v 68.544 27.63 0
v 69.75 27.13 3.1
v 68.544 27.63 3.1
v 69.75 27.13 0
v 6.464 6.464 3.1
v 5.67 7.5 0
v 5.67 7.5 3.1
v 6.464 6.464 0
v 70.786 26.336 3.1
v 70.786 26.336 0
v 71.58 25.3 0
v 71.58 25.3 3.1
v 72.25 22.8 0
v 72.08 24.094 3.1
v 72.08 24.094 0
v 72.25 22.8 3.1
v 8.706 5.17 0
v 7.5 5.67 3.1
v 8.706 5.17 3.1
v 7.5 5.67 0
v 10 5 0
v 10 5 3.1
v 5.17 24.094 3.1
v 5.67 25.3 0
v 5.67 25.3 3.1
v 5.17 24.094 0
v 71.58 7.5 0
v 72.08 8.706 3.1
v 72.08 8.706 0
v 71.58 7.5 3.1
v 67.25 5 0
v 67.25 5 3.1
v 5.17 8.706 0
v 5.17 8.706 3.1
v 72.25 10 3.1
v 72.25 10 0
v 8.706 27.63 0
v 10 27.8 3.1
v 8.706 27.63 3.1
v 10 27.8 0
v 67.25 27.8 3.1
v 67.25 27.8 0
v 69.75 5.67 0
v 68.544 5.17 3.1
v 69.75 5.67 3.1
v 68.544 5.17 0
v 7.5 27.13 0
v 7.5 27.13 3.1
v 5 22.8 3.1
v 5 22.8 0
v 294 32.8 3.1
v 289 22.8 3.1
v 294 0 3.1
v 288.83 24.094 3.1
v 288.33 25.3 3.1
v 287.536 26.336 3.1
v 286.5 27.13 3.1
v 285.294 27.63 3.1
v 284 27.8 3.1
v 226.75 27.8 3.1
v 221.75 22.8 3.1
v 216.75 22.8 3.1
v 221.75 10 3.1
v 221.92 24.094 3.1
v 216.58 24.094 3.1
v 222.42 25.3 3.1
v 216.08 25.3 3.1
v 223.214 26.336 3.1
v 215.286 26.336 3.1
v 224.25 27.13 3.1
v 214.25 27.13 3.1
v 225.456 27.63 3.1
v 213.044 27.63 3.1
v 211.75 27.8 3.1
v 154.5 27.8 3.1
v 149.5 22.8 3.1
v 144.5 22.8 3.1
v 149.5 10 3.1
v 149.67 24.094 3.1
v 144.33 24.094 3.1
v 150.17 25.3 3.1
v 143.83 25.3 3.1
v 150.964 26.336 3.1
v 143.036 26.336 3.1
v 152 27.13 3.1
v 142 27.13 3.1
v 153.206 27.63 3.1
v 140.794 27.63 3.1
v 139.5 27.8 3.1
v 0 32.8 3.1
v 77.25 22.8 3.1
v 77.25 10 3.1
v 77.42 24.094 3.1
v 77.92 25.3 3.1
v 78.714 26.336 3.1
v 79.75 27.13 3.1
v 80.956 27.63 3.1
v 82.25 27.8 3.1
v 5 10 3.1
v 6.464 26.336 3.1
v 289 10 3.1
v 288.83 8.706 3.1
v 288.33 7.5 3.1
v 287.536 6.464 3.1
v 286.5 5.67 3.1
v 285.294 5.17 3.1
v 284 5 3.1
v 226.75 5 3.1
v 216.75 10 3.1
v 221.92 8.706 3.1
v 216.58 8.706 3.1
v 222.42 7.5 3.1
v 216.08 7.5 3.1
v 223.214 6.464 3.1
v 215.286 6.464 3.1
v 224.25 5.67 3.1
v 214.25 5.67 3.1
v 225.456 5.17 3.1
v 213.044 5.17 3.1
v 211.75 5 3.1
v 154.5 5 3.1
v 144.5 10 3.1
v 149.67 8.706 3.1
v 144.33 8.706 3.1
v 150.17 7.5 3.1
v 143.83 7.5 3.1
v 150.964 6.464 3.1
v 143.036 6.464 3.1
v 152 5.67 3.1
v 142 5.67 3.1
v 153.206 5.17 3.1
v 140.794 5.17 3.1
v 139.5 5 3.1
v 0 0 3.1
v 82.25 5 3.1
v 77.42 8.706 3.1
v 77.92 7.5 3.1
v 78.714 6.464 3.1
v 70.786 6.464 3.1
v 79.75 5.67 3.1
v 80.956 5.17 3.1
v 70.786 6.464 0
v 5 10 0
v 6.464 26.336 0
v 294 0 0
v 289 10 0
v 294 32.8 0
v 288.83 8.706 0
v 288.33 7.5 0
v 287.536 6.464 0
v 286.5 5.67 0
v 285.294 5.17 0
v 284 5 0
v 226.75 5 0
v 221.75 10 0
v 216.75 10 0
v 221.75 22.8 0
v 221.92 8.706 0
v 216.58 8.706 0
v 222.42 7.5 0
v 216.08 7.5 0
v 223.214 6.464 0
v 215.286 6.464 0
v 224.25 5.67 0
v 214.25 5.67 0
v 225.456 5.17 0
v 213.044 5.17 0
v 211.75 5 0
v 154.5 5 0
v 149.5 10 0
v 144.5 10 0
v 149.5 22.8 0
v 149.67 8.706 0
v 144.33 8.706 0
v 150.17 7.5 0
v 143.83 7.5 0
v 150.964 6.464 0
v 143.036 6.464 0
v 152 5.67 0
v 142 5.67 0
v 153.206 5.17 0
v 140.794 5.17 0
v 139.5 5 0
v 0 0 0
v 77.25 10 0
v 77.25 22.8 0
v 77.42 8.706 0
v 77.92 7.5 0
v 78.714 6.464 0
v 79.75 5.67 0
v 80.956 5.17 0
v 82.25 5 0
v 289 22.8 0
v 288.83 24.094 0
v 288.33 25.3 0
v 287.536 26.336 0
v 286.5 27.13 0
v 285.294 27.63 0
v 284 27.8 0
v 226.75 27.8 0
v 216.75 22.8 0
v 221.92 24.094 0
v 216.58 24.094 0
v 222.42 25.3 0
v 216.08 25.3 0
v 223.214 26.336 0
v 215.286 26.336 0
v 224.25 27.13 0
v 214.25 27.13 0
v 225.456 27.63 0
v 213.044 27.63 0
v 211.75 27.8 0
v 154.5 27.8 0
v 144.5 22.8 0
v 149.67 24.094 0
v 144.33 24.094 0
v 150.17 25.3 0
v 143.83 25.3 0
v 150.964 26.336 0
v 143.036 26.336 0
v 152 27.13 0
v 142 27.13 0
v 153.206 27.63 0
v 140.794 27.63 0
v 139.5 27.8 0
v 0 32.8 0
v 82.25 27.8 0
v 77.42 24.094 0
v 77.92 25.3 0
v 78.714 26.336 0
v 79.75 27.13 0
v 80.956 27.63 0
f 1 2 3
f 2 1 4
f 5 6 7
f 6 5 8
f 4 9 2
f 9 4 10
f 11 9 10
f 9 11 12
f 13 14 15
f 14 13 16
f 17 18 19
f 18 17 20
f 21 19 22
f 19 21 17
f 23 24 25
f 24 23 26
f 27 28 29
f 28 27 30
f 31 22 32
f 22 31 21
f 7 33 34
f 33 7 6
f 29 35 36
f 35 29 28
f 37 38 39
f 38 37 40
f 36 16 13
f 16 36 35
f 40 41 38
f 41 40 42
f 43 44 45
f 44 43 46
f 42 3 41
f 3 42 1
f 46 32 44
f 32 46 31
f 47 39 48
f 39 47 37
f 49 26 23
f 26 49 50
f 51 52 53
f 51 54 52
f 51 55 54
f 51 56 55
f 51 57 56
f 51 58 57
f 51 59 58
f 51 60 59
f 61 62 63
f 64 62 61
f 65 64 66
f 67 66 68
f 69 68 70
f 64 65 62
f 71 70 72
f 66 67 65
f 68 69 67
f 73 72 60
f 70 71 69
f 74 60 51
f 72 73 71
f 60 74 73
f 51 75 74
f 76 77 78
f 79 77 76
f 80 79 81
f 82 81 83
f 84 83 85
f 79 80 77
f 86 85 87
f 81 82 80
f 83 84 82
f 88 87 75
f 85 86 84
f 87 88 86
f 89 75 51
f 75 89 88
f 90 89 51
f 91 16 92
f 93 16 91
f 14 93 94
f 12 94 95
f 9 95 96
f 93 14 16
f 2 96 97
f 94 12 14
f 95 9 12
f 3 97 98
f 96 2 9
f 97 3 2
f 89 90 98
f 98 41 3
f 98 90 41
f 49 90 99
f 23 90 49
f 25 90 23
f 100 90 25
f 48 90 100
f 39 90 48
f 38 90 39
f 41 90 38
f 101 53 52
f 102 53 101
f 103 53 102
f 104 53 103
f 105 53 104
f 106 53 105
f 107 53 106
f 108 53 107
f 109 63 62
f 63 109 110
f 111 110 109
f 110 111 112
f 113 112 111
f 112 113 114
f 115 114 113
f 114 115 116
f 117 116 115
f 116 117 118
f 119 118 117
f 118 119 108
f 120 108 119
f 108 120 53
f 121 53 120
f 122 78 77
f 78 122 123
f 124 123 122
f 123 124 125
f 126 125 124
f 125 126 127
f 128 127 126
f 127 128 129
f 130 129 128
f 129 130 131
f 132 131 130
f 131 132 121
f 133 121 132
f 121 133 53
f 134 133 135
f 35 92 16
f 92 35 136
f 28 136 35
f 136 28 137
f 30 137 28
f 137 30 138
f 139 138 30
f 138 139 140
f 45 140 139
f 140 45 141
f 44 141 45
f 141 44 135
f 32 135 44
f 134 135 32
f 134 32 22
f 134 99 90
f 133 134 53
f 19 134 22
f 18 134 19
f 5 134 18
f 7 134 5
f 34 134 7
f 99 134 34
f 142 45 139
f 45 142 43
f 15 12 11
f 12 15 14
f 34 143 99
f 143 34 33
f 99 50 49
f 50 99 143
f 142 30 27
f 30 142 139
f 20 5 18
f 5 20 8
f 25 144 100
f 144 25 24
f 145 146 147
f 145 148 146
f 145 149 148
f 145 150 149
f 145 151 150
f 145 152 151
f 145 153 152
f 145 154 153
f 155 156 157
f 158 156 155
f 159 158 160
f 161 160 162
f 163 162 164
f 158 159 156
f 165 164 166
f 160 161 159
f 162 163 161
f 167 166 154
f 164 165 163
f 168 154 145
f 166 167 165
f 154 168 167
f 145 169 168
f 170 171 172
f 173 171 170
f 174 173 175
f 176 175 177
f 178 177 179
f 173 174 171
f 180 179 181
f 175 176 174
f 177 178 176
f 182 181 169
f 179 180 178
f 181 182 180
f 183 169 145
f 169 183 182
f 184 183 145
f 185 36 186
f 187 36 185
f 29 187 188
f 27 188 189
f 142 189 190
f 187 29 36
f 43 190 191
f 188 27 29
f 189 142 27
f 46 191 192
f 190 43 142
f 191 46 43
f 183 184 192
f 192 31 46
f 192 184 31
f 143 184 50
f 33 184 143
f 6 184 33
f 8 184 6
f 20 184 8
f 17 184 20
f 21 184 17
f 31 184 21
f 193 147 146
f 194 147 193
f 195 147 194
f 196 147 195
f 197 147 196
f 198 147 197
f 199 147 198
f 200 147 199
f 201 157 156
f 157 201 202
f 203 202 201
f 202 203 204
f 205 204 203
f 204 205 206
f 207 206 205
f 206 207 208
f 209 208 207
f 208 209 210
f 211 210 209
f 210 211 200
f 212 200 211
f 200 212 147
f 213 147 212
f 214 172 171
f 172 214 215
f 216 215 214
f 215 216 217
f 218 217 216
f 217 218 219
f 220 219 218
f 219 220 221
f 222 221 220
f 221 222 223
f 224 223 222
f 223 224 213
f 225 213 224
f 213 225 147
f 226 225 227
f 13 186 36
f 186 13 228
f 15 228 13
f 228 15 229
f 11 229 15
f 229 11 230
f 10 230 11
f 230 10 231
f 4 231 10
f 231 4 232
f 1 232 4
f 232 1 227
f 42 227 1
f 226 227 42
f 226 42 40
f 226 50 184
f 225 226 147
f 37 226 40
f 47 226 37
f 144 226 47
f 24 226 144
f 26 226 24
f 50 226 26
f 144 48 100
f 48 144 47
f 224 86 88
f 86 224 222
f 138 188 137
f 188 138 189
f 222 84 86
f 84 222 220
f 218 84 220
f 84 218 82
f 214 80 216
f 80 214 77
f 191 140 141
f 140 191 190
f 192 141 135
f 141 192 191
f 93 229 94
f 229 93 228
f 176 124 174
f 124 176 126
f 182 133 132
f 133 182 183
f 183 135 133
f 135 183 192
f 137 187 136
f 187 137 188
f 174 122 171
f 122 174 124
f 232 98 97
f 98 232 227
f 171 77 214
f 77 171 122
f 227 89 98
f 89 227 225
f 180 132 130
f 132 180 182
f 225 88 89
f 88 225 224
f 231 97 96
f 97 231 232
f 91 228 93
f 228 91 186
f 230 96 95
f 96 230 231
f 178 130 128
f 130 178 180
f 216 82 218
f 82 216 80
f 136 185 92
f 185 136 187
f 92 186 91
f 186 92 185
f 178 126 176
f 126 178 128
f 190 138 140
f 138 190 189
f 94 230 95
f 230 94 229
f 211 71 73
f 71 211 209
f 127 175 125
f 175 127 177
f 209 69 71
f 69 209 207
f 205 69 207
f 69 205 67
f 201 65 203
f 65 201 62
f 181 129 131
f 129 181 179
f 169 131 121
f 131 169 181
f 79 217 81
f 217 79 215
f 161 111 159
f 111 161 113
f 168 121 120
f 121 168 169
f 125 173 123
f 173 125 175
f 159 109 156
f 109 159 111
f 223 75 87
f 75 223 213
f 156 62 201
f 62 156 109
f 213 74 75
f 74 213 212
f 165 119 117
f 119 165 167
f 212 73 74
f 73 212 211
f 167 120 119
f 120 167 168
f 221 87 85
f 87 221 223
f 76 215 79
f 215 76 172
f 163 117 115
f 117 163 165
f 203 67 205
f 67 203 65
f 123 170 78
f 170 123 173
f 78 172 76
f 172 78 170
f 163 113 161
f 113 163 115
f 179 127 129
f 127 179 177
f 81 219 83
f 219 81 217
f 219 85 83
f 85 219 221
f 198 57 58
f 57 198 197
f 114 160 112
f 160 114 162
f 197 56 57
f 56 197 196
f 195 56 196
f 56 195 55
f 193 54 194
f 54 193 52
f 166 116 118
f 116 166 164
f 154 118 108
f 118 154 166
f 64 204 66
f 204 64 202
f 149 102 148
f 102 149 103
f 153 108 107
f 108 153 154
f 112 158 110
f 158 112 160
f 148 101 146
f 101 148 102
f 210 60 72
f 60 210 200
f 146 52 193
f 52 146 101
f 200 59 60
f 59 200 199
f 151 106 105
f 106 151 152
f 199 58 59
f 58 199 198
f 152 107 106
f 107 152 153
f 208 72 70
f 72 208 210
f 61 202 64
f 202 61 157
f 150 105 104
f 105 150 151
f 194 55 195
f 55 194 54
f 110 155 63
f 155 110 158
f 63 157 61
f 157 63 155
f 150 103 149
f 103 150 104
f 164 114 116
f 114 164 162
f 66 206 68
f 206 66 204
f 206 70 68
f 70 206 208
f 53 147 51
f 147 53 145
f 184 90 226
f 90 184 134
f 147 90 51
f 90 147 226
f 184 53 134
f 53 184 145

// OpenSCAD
// file: includes/Store Hero Utilities.scad
module rounded_square(dimensions, r, center = false) {
    x = dimensions[0];
    y = dimensions[1];
    translate([center ? 0 : r, center ? 0 : r, 0])
        minkowski() {
            square([x - 2 * r, y - 2 * r], center);
            circle(r = r);
        }
}

module rounded_cube(dimensions, r, center = false) {
    x = dimensions[0];
    y = dimensions[1];
    z = dimensions[2];
    translate([center ? - x / 2 : 0, center ? - y / 2 : 0, center ? - z / 2 : 0])
        hull() {
            translate([r, r, r]) sphere(r = r);
            translate([x - r, r, r]) sphere(r = r);
            translate([x - r, y - r, r]) sphere(r = r);
            translate([r, y - r, r]) sphere(r = r);
            translate([r, r, z - r]) sphere(r = r);
            translate([x - r, r, z - r]) sphere(r = r);
            translate([x - r, y - r, z - r]) sphere(r = r);
            translate([r, y - r, z - r]) sphere(r = r);
        }
}
// file: includes/Store Hero Variables.scad
BASE_SIZE = 49;
BASE_HEIGHT = 36.25;

WALL_THICKNESS = 1.4;
WALL_CORNER_ROUNDING_RADIUS_OUTER = 2;
WALL_CORNER_ROUNDING_RADIUS_INNER = 0.5;

FOOT_HEIGHT = 1.5;
FOOT_TOLERANCE = 0.8;
FOOT_TO_WALL_SIZE = WALL_THICKNESS + FOOT_TOLERANCE;
FOOT_TO_WALL_XY_SIZE = FOOT_TO_WALL_SIZE;
FOOT_TO_WALL_Z_SIZE = FOOT_TO_WALL_SIZE;
FOOT_CORNER_ROUNDING_RADIUS = 0.3;
FLOOR_THICKNESS = WALL_THICKNESS;
FOOT_CHAMFER_SIZE = 0.6;

DISPLAY_ROUNDING_RADIUS = 2;
DISPLAY_DEPTH = 6;
DISPLAY_HEIGHT = 15;
DISPLAY_Z_INSET = FOOT_HEIGHT + FOOT_TO_WALL_Z_SIZE + 0.5;
DISPLAY_SPACING = 2;

GRID_FLOOR_THICKNESS = 0.8;
GRID_WALL_HEIGHT = FOOT_HEIGHT + FOOT_TOLERANCE;
GRID_WALL_TOLERANCE = 0.2;
GRID_WALL_THICKNESS = WALL_THICKNESS - GRID_WALL_TOLERANCE;
GRID_HOLE_SIZE = 40;
GRID_HOLE_ROUNDING_RADIUS = 5;

IKEA_ALEX_DRAWER_SPACER_HEIGHT = GRID_FLOOR_THICKNESS + GRID_WALL_HEIGHT;
IKEA_ALEX_DRAWER_SPACER_WIDTH = 32.8;
IKEA_ALEX_DRAWER_SPACER_LENGTH = 294;
IKEA_ALEX_DRAWER_SPACER_NR_CUTOUTS = 4;
IKEA_ALEX_DRAWER_SPACER_CUTOUT_SPACING = 5;
IKEA_ALEX_DRAWER_SPACER_CUTOUT_ROUNDING_RADIUS = 5;
// main file
////////////////////////////////////////////////////////////////////////////////
// ### OPENSCAD SPECIAL VARIABLES
////////////////////////////////////////////////////////////////////////////////
$fn = 24;


////////////////////////////////////////////////////////////////////////////////
// ### GLOBAL VARIABLES
////////////////////////////////////////////////////////////////////////////////
include <includes/Store Hero Variables.scad>


////////////////////////////////////////////////////////////////////////////////
// ### UTILITY MODULES
////////////////////////////////////////////////////////////////////////////////
include <includes/Store Hero Utilities.scad>


////////////////////////////////////////////////////////////////////////////////
// ### MAIN RENDERING
////////////////////////////////////////////////////////////////////////////////
main();


////////////////////////////////////////////////////////////////////////////////
// ### MODULES
////////////////////////////////////////////////////////////////////////////////
module main() {
    difference() {
        plate();
        plate_cutouts();
    }
}

module plate() {
    cube([IKEA_ALEX_DRAWER_SPACER_LENGTH, IKEA_ALEX_DRAWER_SPACER_WIDTH, IKEA_ALEX_DRAWER_SPACER_HEIGHT]);
}

module plate_cutouts() {
    length = ((IKEA_ALEX_DRAWER_SPACER_LENGTH - IKEA_ALEX_DRAWER_SPACER_CUTOUT_SPACING) / IKEA_ALEX_DRAWER_SPACER_NR_CUTOUTS)
        - IKEA_ALEX_DRAWER_SPACER_CUTOUT_SPACING;
    width = IKEA_ALEX_DRAWER_SPACER_WIDTH - 2 * IKEA_ALEX_DRAWER_SPACER_CUTOUT_SPACING;
    for (i = [0 : IKEA_ALEX_DRAWER_SPACER_NR_CUTOUTS - 1]) {
        x_offset = IKEA_ALEX_DRAWER_SPACER_CUTOUT_SPACING + i * (length + IKEA_ALEX_DRAWER_SPACER_CUTOUT_SPACING);
        translate([x_offset, IKEA_ALEX_DRAWER_SPACER_CUTOUT_SPACING, 0])
            linear_extrude(IKEA_ALEX_DRAWER_SPACER_HEIGHT)
                rounded_square([length, width], IKEA_ALEX_DRAWER_SPACER_CUTOUT_ROUNDING_RADIUS);
    }
}
